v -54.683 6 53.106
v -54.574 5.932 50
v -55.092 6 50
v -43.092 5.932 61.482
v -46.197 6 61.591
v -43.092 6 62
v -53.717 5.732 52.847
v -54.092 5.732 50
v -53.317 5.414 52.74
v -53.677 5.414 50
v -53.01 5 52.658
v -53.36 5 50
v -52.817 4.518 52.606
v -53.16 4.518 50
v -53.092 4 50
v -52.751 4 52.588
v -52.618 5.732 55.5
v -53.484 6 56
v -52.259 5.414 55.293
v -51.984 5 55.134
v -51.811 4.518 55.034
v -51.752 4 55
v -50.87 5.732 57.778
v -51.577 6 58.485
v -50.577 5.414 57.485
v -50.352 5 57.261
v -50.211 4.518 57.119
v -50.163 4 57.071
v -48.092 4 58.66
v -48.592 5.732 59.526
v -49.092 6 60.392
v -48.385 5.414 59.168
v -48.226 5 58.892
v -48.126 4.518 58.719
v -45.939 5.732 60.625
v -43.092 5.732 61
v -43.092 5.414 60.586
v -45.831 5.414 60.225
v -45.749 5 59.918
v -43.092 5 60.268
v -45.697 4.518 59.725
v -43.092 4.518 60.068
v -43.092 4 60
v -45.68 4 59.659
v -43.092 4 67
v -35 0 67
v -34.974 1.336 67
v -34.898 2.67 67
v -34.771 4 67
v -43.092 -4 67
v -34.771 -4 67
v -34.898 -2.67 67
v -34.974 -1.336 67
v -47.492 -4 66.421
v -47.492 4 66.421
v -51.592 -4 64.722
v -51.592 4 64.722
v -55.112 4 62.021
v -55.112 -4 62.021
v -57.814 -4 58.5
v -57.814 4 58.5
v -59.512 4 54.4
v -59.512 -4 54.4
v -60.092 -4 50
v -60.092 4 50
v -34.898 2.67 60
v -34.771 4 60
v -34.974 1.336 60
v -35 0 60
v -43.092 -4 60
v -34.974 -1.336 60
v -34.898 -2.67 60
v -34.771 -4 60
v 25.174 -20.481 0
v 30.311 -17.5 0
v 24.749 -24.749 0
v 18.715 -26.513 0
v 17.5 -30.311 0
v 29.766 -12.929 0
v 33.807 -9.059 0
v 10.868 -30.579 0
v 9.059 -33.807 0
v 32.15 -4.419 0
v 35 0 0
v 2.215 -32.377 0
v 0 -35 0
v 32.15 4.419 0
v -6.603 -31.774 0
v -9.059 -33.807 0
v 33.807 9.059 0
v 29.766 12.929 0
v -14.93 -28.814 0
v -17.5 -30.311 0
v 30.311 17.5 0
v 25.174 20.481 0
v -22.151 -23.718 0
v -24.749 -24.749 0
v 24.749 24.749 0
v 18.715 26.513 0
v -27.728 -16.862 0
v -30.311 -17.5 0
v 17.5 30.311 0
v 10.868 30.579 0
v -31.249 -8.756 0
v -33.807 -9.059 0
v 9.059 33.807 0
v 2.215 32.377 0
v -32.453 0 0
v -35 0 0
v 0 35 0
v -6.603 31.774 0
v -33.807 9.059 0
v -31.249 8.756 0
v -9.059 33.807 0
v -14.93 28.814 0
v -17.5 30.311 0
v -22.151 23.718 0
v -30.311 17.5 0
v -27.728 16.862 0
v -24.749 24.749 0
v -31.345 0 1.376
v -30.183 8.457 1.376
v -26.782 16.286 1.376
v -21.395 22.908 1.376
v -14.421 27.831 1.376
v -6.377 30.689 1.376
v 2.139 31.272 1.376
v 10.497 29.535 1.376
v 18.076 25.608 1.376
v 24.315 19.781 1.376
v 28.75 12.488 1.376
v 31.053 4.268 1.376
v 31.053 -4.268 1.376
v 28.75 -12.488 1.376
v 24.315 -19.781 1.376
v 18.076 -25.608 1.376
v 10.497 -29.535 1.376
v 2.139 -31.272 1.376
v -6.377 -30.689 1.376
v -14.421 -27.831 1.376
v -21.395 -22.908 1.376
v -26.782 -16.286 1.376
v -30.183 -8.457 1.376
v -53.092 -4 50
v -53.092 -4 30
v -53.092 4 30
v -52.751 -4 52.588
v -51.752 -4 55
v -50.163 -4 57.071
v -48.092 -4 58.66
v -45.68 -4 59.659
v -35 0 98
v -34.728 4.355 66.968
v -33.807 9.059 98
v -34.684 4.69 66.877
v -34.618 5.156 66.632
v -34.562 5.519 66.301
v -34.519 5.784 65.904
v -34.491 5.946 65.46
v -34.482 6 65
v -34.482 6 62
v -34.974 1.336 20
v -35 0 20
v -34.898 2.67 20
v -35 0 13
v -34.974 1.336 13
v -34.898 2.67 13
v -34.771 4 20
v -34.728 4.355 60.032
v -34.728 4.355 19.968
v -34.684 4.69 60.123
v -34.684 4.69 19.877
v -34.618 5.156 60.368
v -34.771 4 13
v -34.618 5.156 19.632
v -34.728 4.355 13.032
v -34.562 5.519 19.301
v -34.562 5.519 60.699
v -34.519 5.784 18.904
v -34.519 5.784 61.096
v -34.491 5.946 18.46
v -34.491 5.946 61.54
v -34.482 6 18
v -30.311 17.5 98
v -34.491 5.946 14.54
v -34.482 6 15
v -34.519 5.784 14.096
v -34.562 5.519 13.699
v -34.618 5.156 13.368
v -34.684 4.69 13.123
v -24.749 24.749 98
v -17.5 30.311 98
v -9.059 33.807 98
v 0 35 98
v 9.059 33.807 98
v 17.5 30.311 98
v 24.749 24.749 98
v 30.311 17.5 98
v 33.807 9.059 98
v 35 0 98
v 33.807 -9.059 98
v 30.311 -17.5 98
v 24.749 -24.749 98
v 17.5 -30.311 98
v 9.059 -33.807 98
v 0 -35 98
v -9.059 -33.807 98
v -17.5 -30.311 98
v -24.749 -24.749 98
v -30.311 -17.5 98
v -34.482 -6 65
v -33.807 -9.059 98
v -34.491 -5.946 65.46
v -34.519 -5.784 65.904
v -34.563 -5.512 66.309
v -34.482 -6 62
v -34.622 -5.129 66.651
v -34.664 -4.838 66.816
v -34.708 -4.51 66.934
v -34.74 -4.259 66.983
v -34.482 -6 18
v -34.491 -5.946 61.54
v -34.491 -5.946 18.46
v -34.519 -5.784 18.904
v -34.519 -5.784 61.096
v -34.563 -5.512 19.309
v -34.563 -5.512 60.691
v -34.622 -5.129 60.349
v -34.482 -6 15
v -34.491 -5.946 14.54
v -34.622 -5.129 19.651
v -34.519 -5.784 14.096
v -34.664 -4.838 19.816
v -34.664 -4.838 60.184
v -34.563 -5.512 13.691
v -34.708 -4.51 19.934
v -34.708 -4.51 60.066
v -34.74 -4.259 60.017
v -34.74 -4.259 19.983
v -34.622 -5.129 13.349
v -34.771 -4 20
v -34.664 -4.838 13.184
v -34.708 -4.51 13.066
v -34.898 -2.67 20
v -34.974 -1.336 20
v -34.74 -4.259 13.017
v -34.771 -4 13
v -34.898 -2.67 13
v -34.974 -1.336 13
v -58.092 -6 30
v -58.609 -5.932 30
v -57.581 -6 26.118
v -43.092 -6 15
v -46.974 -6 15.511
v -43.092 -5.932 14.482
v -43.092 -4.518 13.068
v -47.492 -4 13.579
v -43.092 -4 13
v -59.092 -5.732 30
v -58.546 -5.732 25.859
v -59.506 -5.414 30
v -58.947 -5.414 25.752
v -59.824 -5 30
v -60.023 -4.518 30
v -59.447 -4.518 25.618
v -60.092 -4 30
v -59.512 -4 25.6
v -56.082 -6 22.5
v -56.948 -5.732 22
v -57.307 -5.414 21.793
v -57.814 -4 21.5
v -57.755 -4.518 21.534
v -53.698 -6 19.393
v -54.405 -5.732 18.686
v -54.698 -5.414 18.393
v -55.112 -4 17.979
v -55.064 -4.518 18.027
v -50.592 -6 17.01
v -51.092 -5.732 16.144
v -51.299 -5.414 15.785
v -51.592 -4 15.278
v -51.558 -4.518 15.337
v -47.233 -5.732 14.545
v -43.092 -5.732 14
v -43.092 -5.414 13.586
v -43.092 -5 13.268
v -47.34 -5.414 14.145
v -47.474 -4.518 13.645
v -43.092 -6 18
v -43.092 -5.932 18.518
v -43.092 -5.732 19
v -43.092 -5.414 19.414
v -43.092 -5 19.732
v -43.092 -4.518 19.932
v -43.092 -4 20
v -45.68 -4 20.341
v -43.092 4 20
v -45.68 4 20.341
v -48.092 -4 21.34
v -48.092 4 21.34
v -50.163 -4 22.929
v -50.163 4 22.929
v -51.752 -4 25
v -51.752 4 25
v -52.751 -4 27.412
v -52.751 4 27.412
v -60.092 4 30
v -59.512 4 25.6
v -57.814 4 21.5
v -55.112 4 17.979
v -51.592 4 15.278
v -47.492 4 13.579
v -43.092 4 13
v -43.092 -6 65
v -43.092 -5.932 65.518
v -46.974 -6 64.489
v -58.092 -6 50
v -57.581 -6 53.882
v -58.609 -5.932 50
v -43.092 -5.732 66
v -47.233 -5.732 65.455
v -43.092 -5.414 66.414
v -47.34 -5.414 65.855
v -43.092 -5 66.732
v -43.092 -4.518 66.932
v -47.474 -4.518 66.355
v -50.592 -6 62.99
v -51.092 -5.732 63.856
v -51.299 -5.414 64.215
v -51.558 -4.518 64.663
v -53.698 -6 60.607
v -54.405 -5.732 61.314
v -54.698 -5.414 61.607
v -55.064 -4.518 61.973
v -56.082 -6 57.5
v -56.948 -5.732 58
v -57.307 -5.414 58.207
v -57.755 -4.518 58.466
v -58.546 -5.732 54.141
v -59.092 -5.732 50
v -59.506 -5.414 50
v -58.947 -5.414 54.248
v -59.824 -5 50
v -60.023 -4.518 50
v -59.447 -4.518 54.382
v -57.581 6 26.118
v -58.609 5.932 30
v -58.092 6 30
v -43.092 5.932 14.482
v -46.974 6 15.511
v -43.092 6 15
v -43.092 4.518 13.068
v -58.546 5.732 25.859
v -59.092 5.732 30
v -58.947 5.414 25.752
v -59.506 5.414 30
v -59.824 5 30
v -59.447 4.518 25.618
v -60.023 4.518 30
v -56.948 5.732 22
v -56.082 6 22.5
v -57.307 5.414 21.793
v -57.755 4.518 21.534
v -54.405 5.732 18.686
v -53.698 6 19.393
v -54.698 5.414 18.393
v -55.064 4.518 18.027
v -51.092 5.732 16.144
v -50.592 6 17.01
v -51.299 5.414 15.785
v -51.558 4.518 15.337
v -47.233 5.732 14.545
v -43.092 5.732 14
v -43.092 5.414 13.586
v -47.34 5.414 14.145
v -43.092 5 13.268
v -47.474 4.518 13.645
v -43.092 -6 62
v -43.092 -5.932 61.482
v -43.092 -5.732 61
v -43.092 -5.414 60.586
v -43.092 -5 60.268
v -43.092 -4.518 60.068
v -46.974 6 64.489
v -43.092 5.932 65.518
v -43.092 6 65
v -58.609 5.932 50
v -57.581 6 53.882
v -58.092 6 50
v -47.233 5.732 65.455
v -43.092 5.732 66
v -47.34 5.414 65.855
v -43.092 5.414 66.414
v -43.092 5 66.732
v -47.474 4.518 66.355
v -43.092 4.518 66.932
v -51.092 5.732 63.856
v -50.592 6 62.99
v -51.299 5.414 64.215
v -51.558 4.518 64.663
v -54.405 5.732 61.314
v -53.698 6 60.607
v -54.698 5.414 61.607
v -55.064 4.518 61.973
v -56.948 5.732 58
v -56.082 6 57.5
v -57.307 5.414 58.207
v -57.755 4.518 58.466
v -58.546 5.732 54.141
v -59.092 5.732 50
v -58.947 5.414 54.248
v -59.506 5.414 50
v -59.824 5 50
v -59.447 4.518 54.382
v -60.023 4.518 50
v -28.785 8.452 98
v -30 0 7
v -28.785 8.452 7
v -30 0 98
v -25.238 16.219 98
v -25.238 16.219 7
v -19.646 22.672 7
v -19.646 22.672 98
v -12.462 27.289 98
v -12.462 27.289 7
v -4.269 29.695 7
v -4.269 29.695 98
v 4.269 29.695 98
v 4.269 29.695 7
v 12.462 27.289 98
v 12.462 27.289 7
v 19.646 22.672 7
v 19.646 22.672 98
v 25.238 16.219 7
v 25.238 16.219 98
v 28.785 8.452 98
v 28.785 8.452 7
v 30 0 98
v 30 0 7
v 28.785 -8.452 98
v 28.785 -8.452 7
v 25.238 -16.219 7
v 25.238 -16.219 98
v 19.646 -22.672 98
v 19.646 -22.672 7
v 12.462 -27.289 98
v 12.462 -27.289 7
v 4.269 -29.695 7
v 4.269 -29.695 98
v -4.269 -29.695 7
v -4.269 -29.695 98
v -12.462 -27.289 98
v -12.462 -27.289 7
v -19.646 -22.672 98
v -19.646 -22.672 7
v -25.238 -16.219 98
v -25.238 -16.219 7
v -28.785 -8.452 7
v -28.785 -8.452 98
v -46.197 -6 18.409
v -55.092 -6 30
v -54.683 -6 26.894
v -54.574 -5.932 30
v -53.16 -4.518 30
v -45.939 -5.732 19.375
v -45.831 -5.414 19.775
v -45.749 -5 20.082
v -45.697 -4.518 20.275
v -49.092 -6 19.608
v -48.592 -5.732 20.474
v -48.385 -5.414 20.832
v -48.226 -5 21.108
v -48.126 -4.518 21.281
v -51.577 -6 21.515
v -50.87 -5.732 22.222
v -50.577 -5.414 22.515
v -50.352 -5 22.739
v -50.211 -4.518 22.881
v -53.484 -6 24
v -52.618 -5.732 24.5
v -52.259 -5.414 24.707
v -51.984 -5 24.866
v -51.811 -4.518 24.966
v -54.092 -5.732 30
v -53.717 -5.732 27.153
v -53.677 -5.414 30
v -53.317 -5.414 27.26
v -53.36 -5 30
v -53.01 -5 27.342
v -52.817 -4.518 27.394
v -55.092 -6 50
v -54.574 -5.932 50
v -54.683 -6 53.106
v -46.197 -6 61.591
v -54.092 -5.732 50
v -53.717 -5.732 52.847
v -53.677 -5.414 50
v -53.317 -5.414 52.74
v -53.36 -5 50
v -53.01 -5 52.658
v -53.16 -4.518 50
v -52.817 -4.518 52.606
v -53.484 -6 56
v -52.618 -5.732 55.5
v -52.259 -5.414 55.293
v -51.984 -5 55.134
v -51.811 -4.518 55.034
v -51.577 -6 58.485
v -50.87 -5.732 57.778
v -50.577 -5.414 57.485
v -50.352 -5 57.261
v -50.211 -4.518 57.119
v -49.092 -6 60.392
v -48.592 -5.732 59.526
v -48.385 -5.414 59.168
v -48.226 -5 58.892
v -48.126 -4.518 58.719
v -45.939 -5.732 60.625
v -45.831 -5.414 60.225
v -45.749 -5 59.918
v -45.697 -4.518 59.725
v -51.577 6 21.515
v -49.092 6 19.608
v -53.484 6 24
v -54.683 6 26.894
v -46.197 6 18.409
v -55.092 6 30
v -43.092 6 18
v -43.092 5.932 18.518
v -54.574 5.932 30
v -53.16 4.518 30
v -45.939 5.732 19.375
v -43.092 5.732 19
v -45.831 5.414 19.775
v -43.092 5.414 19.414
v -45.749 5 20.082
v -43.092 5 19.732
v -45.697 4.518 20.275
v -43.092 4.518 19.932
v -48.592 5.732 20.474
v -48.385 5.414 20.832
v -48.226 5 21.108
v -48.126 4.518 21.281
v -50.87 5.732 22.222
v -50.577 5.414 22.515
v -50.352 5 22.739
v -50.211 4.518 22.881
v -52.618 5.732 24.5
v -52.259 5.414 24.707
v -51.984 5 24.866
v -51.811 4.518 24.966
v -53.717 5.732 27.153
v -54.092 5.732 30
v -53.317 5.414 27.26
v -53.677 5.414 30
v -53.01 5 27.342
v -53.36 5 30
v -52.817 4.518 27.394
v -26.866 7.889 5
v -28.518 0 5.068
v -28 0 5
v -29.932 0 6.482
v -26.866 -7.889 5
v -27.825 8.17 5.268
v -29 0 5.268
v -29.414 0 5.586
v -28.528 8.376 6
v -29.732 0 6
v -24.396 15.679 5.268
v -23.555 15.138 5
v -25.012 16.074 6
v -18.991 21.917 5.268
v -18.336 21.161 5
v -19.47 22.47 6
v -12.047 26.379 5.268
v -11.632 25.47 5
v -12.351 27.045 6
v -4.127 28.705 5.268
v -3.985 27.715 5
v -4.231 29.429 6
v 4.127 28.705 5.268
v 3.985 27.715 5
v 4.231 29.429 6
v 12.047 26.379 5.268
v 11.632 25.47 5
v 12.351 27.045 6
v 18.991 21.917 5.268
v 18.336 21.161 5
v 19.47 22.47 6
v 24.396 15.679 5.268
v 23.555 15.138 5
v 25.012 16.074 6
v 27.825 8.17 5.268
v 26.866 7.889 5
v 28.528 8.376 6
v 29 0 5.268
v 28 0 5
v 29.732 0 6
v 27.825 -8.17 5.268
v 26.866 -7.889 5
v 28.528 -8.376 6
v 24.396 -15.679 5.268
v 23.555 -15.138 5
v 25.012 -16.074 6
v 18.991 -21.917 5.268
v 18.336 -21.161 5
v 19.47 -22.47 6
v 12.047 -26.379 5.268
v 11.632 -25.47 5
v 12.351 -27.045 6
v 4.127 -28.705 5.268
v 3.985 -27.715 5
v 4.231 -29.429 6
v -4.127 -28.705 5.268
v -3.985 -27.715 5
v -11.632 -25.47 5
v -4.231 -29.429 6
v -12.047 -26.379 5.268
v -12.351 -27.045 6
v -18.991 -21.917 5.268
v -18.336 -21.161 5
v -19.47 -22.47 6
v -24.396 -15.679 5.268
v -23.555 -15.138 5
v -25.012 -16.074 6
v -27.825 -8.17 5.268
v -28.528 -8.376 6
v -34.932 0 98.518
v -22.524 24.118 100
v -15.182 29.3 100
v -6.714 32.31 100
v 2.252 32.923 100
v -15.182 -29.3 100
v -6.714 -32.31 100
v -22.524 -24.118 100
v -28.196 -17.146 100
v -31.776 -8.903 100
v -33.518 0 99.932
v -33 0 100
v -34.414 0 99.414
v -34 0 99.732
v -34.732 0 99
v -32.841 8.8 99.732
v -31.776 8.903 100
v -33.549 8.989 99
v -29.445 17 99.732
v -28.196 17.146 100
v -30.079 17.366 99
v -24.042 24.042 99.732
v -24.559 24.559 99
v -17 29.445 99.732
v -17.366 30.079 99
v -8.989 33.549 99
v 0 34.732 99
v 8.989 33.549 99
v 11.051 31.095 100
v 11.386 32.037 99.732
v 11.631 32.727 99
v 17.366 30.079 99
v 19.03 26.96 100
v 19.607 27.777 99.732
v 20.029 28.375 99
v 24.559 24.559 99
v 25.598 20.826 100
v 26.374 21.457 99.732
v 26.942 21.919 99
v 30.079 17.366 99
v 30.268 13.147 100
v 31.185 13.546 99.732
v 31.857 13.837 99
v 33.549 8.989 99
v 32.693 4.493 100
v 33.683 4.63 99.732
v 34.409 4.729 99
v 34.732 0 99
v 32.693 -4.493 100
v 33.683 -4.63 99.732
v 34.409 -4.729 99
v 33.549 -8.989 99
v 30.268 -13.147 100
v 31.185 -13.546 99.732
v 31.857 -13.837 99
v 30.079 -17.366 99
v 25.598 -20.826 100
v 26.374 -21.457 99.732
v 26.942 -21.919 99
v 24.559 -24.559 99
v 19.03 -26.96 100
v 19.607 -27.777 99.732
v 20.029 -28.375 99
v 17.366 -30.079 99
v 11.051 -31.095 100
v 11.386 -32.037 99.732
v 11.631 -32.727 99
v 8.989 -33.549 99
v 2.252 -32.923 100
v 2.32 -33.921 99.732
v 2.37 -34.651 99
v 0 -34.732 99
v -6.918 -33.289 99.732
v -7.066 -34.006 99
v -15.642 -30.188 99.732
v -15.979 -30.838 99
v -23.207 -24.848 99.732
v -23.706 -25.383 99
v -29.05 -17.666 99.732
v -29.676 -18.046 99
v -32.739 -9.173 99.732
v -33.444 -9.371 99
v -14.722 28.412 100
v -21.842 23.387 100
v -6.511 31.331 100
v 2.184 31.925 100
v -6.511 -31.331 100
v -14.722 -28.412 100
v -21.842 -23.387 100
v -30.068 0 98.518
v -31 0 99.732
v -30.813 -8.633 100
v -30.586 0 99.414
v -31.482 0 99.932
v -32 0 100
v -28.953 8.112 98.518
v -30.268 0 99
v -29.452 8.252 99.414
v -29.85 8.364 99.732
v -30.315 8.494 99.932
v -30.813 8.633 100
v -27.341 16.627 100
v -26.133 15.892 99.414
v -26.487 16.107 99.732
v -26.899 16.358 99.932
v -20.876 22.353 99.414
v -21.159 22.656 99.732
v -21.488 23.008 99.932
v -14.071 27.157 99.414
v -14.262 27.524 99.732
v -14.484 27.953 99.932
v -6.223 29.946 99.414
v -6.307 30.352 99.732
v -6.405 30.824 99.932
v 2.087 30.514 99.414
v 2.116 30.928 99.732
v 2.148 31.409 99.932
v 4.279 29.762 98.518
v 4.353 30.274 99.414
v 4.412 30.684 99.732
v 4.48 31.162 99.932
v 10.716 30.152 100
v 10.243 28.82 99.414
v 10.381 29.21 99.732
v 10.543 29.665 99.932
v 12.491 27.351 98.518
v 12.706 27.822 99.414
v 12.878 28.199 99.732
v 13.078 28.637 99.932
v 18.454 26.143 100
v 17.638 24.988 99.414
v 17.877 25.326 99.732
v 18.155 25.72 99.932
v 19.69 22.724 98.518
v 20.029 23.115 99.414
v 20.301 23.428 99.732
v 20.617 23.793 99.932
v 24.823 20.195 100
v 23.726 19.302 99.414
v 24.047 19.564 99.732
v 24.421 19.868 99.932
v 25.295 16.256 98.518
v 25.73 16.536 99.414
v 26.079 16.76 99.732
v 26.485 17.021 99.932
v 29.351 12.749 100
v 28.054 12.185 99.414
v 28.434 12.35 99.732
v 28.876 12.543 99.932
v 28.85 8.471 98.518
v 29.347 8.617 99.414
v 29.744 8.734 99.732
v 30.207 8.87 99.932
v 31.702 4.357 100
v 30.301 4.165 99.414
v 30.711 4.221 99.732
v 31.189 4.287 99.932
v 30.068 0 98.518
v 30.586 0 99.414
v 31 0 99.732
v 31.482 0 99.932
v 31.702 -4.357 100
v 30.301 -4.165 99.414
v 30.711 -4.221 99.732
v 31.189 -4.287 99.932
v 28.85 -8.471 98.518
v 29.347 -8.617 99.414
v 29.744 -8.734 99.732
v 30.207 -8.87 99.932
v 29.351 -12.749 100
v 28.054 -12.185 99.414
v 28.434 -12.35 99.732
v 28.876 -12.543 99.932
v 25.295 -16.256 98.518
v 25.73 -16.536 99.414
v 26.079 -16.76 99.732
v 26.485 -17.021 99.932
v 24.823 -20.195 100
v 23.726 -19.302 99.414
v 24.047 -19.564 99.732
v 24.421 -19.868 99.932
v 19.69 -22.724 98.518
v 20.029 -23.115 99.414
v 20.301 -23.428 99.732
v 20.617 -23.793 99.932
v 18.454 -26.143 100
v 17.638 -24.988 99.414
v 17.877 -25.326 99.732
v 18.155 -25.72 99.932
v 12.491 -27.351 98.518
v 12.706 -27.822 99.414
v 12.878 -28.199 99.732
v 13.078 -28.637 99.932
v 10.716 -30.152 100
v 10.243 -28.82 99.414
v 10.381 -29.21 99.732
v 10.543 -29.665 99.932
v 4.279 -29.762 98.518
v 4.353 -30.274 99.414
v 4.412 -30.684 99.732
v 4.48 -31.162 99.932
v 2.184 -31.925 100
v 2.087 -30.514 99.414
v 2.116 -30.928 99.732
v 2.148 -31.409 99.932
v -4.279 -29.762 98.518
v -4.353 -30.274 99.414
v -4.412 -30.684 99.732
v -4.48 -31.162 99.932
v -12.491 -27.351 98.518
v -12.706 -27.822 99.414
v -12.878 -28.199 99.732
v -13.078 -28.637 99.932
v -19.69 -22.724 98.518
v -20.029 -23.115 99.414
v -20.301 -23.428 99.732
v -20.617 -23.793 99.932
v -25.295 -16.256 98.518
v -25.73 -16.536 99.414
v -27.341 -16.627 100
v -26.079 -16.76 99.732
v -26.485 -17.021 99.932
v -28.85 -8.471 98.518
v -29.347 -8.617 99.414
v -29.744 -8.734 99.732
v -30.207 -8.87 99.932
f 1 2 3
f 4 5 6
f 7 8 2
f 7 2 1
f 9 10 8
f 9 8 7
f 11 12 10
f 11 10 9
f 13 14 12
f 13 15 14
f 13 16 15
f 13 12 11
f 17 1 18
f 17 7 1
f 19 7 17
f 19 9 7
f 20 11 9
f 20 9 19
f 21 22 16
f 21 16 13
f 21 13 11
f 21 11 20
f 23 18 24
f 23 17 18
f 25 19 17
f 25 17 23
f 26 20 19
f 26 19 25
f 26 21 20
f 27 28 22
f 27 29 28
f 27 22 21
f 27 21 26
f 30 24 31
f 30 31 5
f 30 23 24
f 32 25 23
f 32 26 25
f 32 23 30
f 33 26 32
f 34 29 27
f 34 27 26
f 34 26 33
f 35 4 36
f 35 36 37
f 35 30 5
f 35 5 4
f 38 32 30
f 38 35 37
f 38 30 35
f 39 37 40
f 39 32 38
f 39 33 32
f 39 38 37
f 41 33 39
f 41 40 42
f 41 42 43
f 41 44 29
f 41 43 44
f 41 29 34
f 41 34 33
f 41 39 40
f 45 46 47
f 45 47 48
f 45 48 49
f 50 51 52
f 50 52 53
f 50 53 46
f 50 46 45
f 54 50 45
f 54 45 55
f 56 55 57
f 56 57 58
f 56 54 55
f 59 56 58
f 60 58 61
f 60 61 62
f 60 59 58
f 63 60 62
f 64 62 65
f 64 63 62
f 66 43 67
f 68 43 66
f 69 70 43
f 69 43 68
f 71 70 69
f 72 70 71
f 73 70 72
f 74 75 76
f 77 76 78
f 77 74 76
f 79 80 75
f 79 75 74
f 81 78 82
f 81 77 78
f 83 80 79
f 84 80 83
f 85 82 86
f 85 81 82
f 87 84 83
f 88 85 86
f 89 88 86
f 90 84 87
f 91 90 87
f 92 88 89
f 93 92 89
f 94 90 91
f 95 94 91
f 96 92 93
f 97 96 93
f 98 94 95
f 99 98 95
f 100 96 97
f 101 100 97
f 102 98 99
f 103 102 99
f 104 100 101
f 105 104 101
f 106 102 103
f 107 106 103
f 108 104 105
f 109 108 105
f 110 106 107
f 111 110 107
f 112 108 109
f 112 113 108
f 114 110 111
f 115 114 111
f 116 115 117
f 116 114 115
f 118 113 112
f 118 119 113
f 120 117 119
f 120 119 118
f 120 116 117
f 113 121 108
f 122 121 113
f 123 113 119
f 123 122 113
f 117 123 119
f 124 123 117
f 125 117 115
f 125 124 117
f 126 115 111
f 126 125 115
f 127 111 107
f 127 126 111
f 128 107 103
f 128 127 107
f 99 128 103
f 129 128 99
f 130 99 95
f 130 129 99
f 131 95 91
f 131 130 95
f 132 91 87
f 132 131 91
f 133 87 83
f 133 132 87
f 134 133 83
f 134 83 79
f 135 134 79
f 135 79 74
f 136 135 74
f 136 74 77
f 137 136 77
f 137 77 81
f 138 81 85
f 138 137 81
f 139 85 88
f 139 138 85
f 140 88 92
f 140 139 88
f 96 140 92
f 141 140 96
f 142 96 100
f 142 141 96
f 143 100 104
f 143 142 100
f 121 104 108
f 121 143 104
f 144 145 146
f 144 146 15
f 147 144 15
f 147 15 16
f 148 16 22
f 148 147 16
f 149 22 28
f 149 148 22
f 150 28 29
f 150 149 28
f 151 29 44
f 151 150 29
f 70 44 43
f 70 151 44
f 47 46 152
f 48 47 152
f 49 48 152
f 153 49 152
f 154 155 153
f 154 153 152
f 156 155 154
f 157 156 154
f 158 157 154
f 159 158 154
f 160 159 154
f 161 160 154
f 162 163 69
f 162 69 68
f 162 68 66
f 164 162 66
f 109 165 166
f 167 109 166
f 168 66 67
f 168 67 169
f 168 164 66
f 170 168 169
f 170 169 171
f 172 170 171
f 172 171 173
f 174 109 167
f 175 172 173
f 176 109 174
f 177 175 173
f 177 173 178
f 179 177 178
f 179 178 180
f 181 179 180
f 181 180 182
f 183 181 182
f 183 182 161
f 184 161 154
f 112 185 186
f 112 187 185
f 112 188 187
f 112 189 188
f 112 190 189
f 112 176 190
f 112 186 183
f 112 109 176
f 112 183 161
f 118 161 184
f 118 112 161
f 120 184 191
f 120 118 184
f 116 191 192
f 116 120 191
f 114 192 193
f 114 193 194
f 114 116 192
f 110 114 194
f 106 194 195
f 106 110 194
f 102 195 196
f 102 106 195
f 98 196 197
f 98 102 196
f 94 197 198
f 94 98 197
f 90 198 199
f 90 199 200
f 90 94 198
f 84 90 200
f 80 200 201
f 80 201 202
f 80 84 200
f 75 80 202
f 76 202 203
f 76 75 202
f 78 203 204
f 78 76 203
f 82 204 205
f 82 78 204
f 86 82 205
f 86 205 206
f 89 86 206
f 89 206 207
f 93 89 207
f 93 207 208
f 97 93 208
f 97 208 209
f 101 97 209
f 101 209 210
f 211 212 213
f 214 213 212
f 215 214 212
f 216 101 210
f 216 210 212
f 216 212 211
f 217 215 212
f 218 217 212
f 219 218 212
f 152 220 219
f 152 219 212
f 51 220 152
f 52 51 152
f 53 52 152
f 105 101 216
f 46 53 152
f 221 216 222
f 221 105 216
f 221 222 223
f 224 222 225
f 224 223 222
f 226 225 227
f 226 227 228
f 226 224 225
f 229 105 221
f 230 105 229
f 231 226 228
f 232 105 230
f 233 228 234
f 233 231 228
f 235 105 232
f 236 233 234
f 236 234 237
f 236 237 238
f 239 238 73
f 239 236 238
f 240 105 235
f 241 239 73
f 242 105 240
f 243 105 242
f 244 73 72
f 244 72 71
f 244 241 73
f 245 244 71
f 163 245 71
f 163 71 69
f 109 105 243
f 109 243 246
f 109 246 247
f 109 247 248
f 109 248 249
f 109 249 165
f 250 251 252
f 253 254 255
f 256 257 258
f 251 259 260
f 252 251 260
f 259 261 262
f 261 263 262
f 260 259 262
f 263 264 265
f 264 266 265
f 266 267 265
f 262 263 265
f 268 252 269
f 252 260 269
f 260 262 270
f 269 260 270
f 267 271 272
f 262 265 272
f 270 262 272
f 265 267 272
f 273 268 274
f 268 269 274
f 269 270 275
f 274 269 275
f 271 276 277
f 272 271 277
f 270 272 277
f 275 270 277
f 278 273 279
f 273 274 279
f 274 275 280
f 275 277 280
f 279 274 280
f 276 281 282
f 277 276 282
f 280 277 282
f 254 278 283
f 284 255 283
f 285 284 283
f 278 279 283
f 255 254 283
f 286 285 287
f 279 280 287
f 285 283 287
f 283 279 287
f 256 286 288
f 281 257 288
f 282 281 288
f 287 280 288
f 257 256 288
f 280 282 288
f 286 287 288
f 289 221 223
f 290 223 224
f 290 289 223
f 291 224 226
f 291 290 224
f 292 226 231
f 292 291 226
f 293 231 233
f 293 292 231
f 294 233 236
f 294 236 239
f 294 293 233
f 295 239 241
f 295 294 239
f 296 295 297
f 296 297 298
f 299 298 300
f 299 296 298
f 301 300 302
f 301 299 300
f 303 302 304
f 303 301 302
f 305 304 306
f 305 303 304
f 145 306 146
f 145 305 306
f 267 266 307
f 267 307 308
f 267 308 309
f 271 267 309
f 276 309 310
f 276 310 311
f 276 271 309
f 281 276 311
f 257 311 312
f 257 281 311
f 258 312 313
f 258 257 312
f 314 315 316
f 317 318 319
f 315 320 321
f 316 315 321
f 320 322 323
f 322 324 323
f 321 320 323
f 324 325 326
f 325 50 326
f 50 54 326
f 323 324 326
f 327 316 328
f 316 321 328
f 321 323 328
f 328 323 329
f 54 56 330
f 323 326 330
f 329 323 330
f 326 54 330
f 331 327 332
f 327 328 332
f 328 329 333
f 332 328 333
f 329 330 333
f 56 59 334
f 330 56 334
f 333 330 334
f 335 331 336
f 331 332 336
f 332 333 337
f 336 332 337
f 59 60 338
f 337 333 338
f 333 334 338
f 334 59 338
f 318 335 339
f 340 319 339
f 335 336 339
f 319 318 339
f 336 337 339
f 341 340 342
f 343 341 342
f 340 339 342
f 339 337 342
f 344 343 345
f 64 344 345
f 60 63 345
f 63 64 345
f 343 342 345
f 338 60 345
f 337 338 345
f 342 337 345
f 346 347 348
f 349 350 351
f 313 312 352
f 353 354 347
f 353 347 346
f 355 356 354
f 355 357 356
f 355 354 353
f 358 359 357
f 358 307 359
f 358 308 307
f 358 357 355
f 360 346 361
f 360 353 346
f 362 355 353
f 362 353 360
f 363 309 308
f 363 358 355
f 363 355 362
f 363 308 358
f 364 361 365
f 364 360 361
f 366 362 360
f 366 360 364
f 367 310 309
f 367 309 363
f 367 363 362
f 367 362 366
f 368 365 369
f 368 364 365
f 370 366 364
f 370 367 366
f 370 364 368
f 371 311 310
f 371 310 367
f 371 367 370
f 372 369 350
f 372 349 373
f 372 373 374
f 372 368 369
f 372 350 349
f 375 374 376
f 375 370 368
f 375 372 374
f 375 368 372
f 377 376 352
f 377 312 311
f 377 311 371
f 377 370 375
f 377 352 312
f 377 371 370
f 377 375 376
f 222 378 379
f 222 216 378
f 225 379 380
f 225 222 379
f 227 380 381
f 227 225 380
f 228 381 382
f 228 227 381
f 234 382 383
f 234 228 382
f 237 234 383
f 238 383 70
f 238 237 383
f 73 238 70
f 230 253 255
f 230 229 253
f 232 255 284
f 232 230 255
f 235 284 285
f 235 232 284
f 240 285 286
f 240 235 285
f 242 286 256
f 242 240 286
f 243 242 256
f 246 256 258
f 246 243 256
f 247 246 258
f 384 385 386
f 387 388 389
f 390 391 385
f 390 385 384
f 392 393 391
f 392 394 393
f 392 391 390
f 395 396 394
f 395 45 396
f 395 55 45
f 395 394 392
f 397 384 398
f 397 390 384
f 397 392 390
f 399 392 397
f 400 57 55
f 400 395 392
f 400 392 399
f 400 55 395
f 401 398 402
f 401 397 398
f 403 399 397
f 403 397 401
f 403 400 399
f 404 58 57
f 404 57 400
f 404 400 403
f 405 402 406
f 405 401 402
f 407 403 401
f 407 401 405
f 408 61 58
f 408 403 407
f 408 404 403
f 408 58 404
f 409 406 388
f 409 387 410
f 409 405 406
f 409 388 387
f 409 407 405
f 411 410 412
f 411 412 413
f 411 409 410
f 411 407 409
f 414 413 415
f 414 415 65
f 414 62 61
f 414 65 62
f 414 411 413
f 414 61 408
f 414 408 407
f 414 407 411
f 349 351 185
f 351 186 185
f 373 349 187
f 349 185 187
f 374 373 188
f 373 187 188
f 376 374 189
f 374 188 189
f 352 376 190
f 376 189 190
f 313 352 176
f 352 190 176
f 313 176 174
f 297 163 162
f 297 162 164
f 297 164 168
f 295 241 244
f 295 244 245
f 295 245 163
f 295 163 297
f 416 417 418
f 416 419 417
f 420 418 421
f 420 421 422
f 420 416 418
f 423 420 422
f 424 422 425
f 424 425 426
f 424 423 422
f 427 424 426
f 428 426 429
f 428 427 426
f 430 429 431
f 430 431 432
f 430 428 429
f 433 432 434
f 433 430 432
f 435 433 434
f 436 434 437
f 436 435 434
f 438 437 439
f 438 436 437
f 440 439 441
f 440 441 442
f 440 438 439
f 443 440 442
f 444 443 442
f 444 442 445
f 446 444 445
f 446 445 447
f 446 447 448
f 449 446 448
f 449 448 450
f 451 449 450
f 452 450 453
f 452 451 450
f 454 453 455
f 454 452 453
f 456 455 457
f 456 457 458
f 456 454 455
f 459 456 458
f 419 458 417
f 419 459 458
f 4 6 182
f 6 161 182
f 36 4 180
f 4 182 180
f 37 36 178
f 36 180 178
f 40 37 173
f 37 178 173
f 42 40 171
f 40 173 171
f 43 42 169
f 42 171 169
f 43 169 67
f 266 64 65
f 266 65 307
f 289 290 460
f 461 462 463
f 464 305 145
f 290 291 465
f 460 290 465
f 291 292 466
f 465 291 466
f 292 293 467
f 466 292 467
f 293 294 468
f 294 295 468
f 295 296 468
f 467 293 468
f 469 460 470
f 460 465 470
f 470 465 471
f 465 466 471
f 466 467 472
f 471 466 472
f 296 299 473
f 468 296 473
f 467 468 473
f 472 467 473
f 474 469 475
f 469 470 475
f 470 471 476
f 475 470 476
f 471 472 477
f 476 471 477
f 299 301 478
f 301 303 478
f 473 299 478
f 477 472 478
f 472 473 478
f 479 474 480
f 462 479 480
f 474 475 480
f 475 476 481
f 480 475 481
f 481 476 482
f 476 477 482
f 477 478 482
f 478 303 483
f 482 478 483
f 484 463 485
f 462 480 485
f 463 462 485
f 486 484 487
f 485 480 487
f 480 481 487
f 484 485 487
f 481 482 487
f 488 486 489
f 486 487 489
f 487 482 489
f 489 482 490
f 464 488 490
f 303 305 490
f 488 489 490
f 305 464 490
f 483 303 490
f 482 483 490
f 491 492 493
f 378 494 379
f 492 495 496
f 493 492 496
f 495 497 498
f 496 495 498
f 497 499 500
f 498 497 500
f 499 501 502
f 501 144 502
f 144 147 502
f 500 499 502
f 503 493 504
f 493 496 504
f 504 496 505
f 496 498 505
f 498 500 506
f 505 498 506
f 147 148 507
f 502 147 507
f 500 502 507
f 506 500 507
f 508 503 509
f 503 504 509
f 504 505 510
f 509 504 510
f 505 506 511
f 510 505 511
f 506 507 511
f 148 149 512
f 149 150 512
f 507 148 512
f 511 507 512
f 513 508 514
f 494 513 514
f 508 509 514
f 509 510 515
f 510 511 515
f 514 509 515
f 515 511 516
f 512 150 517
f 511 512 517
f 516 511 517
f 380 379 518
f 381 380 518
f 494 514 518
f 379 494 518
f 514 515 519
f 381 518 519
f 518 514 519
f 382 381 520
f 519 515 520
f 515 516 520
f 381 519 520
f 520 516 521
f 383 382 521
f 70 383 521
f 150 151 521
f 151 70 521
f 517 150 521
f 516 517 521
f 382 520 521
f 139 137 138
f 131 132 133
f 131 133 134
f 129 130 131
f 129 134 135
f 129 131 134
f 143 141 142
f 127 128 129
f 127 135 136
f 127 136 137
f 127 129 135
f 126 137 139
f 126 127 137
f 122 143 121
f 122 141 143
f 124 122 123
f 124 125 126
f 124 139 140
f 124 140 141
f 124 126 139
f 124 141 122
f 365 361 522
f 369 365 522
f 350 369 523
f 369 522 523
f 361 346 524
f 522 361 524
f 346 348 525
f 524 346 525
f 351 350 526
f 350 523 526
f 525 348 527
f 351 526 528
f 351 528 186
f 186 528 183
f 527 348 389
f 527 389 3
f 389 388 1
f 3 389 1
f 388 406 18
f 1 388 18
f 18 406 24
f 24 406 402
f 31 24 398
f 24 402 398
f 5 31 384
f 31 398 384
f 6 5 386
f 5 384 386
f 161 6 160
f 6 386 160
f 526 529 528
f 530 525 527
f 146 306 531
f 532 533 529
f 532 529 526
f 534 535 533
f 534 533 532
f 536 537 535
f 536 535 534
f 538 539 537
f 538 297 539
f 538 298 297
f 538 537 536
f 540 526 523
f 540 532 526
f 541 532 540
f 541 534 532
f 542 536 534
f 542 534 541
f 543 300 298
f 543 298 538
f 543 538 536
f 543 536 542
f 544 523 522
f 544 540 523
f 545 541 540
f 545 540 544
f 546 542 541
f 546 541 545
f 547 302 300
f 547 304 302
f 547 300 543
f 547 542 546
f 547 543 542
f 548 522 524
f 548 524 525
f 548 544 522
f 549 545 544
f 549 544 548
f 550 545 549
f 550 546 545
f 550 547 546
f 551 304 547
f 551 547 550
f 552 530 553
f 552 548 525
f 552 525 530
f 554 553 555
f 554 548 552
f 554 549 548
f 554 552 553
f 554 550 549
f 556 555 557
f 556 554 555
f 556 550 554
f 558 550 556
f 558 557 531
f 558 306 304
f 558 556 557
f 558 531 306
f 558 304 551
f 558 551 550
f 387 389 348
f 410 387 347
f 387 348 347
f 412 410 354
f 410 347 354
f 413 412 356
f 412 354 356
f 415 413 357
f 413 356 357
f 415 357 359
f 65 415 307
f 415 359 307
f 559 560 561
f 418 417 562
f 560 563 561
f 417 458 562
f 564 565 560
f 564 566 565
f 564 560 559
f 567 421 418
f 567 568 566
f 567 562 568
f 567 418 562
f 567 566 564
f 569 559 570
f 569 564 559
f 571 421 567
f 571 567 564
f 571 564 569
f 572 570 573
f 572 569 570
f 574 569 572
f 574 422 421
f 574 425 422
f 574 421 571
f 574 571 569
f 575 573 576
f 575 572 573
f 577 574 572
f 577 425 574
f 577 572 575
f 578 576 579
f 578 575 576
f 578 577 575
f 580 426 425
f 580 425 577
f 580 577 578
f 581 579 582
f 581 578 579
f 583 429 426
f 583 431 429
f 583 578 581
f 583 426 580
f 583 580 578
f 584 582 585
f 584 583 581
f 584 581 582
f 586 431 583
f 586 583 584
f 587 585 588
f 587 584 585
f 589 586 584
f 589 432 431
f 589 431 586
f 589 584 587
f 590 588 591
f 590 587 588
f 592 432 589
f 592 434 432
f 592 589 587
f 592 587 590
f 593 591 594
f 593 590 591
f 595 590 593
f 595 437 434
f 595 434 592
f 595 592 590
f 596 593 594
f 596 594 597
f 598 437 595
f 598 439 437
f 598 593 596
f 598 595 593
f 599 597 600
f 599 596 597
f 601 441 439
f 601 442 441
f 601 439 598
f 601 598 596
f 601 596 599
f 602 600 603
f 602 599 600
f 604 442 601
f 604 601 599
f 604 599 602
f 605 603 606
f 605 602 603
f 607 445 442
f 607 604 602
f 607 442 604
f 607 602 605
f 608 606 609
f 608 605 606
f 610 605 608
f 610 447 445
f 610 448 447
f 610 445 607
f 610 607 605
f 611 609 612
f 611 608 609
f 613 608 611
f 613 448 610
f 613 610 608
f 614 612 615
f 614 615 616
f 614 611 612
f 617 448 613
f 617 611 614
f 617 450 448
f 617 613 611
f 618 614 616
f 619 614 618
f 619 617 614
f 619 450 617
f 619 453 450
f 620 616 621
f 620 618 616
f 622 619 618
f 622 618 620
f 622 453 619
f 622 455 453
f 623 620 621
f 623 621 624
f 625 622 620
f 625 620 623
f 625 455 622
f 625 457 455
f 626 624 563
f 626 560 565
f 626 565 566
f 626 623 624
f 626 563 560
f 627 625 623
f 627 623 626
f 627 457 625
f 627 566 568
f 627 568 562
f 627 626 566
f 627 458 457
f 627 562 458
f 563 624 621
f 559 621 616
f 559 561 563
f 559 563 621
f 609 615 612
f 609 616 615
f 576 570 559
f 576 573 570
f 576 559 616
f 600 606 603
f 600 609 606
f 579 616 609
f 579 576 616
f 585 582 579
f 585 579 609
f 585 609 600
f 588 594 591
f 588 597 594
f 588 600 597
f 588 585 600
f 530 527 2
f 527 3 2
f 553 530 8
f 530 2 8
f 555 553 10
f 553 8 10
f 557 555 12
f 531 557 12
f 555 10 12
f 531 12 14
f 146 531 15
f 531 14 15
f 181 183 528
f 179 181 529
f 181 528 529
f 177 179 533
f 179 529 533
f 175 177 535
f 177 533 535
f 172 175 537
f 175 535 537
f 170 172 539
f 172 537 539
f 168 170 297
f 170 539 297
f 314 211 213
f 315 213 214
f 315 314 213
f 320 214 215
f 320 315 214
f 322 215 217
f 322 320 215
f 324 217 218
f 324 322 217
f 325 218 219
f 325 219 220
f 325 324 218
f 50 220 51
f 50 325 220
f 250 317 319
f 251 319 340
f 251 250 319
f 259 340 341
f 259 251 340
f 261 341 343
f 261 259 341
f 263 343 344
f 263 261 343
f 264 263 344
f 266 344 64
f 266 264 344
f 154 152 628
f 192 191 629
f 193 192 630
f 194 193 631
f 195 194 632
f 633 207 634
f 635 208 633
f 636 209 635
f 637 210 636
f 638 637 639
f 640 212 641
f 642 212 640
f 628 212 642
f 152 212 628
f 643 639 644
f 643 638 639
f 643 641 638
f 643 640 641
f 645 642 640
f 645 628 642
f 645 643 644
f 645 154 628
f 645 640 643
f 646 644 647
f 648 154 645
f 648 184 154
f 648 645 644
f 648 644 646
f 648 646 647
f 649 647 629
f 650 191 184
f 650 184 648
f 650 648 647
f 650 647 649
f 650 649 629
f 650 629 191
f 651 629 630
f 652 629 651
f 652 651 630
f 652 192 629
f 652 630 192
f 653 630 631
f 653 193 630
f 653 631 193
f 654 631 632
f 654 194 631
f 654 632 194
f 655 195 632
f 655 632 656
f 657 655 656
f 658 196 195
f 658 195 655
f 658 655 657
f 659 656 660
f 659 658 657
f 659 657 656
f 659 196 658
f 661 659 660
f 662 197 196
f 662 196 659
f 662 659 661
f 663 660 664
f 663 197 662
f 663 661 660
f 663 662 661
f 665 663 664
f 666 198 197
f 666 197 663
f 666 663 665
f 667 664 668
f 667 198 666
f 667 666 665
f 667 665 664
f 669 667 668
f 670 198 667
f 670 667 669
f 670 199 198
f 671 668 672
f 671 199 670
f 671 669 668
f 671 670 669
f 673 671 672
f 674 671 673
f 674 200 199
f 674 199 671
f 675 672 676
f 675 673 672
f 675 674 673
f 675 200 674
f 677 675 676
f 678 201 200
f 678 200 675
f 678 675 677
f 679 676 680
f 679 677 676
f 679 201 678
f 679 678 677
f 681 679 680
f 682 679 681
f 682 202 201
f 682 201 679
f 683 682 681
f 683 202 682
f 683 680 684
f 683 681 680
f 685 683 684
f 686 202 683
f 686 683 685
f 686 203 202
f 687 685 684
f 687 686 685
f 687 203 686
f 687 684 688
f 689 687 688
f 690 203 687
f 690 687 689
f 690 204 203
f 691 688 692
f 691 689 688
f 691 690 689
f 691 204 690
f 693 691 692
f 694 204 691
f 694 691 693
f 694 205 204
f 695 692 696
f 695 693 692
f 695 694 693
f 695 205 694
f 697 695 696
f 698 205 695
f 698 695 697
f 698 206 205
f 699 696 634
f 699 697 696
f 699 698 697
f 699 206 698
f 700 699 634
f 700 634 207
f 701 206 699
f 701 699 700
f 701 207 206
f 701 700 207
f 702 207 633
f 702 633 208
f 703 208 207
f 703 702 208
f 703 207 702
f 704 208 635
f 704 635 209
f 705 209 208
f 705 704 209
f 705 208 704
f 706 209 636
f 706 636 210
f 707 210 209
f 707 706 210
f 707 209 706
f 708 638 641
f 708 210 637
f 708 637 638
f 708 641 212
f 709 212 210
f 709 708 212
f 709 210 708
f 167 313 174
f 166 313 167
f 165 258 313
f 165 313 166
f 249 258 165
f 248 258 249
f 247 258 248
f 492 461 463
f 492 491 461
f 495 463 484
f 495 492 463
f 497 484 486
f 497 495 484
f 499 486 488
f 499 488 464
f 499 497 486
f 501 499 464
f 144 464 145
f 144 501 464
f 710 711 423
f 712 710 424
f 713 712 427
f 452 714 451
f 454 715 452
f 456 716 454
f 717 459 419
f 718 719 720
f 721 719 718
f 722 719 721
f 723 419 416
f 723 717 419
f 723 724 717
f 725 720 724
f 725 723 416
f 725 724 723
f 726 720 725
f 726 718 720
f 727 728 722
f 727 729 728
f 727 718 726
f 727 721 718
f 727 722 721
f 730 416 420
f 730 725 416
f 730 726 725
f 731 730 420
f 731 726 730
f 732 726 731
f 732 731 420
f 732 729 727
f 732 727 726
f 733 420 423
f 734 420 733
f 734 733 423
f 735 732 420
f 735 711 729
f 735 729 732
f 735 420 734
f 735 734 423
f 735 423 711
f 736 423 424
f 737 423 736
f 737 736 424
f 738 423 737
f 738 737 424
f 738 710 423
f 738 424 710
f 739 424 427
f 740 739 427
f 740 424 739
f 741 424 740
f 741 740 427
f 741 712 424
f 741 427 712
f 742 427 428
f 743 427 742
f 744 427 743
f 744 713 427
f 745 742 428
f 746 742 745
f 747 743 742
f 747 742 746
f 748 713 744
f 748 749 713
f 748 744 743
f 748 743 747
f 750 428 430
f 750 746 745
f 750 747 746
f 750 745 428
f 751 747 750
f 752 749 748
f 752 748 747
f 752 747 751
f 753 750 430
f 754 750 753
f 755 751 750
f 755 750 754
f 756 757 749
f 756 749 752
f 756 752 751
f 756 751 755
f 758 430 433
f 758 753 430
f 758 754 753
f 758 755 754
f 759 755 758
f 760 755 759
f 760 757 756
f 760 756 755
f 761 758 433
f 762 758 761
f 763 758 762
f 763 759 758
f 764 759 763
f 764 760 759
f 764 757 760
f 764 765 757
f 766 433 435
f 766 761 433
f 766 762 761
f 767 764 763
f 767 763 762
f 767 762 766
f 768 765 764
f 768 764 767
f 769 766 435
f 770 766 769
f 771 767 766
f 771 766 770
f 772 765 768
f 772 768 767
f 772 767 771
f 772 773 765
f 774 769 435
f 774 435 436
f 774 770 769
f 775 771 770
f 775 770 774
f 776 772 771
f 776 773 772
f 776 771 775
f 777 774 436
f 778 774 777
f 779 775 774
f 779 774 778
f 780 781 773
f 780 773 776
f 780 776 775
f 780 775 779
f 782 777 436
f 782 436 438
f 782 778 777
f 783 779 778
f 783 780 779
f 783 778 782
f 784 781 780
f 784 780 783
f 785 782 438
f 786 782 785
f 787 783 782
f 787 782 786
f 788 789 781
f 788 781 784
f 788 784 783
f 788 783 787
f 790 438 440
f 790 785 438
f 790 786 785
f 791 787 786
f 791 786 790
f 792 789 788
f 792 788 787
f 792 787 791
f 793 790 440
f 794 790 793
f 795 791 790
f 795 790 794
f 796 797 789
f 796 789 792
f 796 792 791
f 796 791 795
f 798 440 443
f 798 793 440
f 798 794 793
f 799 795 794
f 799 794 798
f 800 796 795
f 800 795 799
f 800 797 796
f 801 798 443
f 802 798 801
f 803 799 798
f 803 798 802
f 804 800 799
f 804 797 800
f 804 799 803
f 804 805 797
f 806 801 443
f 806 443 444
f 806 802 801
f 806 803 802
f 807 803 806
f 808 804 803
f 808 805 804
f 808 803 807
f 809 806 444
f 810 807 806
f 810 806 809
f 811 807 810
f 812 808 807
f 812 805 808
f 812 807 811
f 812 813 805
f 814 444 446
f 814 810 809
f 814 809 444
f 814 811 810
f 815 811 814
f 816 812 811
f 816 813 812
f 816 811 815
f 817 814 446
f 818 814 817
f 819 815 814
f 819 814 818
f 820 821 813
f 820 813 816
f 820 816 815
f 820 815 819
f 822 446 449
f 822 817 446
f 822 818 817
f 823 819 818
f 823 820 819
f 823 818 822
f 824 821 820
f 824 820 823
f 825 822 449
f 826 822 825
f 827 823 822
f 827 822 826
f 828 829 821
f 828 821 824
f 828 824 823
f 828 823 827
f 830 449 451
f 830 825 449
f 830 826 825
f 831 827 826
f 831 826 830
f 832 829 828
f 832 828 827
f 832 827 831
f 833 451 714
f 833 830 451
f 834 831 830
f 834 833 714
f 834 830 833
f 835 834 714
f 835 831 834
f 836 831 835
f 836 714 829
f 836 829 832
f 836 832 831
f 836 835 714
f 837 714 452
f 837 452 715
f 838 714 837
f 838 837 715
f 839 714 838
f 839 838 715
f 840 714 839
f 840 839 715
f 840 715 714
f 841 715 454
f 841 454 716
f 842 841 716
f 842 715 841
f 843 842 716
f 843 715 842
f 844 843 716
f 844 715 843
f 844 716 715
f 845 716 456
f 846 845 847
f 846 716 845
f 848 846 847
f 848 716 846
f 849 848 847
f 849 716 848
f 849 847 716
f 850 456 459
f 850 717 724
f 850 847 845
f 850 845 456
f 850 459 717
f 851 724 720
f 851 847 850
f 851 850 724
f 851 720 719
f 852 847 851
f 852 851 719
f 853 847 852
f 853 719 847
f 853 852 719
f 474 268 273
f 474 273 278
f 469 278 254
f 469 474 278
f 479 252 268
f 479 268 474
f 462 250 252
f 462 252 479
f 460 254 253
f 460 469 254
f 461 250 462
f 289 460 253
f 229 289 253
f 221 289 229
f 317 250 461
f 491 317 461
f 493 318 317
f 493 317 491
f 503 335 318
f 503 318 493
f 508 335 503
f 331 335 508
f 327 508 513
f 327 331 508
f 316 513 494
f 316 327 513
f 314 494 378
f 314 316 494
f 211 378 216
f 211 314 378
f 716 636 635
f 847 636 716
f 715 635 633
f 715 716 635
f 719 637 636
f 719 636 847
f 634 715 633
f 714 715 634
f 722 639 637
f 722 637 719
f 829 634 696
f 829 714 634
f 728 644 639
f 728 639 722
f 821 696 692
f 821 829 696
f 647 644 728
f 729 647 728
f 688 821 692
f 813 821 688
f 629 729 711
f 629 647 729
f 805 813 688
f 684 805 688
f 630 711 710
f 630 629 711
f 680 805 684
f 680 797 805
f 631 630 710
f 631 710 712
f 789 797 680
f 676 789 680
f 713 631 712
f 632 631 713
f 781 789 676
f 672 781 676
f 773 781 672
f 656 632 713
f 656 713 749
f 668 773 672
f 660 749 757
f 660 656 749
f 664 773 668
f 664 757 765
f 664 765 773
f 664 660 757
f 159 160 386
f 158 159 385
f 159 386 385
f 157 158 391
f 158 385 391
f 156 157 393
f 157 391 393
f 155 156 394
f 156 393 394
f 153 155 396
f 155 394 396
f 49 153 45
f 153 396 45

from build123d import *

# Parameters (mm, degrees)
F3_DEPTH = 6
F4_R     = 2


with BuildPart() as f1:
    # F0 (on Front) → F1 (revolve)
    with BuildSketch(Plane.XZ):
        with BuildLine():
            Line((0, 1.375929), (0, 5))
            Line((0, 5), (-28, 5))
            ThreePointArc((-28, 5), (-29.414214, 5.585786), (-30, 7))
            Line((-30, 7), (-30, 98))
            ThreePointArc((-30, 98), (-30.585786, 99.414214), (-32, 100))
            Line((-32, 100), (-33, 100))
            ThreePointArc((-33, 100), (-34.414214, 99.414214), (-35, 98))
            Line((-35, 98), (-35, 0))
            Line((-35, 0), (-32.452703, 0))
            Line((-32.452703, 0), (-31.345069, 1.375929))
            Line((-31.345069, 1.375929), (0, 1.375929))
        make_face()
    revolve(axis=Axis((0, 0, 64.654013), (0, 0, -1)))

    # F2 (on Front) → F3 (join, symmetric)
    with BuildSketch(Plane.XZ):
        with BuildLine():
            Line((-43.091623, 60), (-33.091623, 60))
            Line((-33.091623, 60), (-33.091623, 67))
            Line((-33.091623, 67), (-43.091623, 67))
            ThreePointArc((-43.091623, 67), (-55.112439, 62.020815), (-60.091623, 50))
            Line((-60.091623, 50), (-60.091623, 30))
            ThreePointArc((-60.091623, 30), (-55.112439, 17.979185), (-43.091623, 13))
            Line((-43.091623, 13), (-33.091623, 13))
            Line((-33.091623, 13), (-33.091623, 20))
            Line((-33.091623, 20), (-43.091623, 20))
            ThreePointArc((-43.091623, 20), (-50.162691, 22.928932), (-53.091623, 30))
            Line((-53.091623, 30), (-53.091623, 50))
            ThreePointArc((-53.091623, 50), (-50.162691, 57.071068), (-43.091623, 60))
        make_face()
    extrude(amount=F3_DEPTH, both=True)

    # F4
    f4_edges = [f1.edges().sort_by_distance(p)[0] for p in [
        (-38.786751, -6, 67),
        (-53.091623, -6, 40),
        (-55.112439, 6, 62.020815),
        (-53.091623, 6, 40),
    ]]
    fillet(f4_edges, radius=F4_R)


solid = f1.part
